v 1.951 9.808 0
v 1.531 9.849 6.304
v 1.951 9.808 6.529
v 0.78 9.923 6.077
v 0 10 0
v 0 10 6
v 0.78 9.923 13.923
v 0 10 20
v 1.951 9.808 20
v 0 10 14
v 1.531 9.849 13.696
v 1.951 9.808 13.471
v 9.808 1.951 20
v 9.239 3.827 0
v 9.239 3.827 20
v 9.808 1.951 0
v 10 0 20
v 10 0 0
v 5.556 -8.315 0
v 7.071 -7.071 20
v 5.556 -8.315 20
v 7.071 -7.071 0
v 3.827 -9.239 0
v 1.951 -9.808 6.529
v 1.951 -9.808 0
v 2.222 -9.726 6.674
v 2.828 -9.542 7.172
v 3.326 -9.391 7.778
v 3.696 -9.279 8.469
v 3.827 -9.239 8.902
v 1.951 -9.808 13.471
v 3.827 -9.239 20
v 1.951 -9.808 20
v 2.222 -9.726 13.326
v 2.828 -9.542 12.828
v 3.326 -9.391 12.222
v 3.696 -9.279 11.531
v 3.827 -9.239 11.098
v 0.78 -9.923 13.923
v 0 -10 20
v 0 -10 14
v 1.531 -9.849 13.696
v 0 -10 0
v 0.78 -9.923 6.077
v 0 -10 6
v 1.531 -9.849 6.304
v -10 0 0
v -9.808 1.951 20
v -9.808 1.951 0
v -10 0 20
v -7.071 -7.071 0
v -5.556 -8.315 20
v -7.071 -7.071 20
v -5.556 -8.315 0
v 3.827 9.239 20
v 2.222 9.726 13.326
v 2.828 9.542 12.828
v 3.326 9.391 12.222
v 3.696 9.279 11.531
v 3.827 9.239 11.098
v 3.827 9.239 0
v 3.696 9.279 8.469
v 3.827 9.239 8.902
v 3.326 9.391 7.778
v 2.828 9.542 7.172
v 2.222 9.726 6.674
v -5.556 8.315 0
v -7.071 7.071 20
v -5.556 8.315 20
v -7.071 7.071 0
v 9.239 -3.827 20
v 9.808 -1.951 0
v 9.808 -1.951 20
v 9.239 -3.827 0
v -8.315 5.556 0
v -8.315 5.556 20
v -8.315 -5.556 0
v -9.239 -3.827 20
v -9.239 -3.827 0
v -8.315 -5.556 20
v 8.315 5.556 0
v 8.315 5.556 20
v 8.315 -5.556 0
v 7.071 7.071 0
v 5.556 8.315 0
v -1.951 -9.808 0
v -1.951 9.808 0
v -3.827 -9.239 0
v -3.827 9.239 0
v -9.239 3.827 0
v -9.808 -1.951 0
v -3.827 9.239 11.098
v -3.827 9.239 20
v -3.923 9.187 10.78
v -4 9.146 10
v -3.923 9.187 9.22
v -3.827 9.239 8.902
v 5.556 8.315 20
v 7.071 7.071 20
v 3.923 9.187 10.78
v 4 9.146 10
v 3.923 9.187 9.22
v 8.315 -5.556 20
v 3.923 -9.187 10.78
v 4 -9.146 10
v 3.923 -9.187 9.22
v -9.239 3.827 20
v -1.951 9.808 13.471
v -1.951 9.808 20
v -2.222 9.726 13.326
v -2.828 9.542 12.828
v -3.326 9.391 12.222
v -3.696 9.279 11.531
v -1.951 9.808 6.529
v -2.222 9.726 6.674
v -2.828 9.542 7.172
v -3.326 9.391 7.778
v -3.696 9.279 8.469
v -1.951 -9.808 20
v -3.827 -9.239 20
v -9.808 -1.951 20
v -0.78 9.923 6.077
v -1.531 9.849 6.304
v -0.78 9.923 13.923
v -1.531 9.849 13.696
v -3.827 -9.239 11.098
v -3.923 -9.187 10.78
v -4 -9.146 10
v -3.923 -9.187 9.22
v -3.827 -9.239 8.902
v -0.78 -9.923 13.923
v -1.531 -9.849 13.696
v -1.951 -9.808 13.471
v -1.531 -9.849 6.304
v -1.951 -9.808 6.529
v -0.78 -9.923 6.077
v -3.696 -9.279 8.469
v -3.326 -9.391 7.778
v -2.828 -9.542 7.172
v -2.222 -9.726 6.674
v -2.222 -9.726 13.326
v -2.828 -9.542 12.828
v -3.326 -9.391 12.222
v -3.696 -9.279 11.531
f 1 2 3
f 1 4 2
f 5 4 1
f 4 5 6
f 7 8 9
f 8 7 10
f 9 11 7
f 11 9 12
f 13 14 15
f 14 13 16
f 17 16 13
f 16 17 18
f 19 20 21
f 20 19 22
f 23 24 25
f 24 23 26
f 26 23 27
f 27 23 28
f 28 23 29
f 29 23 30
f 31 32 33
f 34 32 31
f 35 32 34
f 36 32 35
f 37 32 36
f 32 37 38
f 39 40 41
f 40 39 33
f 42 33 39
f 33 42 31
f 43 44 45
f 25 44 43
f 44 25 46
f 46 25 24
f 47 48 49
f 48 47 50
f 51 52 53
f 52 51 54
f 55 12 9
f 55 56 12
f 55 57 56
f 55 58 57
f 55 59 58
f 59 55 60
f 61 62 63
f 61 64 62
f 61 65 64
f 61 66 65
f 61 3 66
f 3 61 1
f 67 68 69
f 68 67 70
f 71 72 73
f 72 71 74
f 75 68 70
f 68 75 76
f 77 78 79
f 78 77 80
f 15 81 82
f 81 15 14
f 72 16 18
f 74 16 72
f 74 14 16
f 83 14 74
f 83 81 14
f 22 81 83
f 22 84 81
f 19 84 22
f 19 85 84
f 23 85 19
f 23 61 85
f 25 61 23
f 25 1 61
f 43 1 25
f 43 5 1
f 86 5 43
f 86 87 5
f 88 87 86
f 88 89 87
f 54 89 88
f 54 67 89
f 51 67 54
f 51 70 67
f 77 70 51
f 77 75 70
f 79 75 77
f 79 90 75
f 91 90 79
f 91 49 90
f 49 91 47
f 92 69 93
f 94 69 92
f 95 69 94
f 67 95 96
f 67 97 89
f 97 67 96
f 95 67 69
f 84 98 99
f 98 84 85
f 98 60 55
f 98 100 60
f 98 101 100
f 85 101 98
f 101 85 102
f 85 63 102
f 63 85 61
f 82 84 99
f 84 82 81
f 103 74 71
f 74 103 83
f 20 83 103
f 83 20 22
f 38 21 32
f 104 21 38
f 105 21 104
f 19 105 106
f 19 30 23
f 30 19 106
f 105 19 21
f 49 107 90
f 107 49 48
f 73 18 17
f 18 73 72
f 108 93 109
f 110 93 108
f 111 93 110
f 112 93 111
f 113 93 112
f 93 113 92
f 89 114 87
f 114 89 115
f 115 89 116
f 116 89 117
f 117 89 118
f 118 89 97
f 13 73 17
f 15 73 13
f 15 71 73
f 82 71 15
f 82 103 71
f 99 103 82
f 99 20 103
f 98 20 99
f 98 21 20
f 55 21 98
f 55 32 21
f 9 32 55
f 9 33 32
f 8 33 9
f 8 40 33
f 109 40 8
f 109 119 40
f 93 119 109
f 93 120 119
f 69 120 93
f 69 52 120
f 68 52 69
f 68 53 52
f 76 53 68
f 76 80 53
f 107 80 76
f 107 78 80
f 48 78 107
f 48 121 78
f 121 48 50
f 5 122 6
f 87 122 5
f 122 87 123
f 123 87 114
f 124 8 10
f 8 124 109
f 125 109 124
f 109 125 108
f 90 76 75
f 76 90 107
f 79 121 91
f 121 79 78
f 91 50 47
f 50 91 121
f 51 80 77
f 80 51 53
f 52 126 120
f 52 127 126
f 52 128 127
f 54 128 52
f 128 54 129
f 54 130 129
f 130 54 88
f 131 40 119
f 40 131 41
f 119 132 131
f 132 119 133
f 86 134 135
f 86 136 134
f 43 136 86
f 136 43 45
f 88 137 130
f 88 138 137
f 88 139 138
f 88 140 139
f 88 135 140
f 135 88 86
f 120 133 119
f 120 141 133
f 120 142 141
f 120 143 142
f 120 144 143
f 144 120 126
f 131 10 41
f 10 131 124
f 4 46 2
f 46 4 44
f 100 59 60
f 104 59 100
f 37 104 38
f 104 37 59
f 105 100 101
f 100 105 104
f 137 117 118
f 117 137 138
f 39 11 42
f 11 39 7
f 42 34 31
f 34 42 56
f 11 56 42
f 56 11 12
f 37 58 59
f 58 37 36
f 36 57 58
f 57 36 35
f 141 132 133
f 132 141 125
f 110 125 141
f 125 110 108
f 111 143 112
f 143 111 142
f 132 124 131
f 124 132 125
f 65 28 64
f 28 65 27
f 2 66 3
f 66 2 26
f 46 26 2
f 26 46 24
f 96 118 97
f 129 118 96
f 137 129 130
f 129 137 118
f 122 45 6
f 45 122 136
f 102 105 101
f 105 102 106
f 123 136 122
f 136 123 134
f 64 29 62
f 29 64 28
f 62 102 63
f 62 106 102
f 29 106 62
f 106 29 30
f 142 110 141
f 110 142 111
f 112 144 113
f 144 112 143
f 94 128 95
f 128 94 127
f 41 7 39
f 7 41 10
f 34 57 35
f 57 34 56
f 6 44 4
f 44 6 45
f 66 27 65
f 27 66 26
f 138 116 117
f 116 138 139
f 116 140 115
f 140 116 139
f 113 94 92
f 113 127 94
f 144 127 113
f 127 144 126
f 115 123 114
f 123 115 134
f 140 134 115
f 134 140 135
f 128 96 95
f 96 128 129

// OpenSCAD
// A cylinder bored across, whose trim is a quartic.
//
// This is roadmap item 4's general case at its smallest. The wall and the bore
// are both declared cylinders and both are exactly right, so nothing is left to
// declare - what is missing is the curve where they meet. Two cylinders
// intersect in a quartic, and STEP has no entity for it: OpenCASCADE's own
// export of this solid writes the trim as a degree-7 B_SPLINE_CURVE_WITH_KNOTS
// of some thirty control points. So the general case is inherently an
// approximation, and it is gated as one.
//
// The band recogniser cannot write either face. A band *is* two rims at a
// constant height, and neither of these rims is: the bore's ends are where it
// meets the wall, and the wall is opened by a hole. Its exact pass therefore
// takes only the arc-bounded parts of the wall - two partial cylinders, twenty
// facets - and leaves the other fifty-two to the trimmed-quadric pass.
//
// That pass now takes ten of them, and it is the *bore* it writes, not the wall.
// The wall is the 32-gon here, so each of its facets is a flat plane, and a
// plane cuts the bore cylinder in an ellipse - exact, and written as one. The
// mesh edges where the bore meets a wall facet are chords of that ellipse; the
// ellipse replaces them, the wall facet on the other side is handed the same
// edge, and the bore's regions stop being bounded off themselves.
// EXPECT: 10 trimmed quadrics written as one face each, replacing 24 facets
//
// So the census moves by arithmetic, not by measurement: each replaced facet was
// one PLANE, so 54 - 24 = 30 remain, and the two partial cylinders the band pass
// already wrote are joined by the ten new ones for 12.
//
// And the ellipses are the model's, down to their axes. The wall's facet normals
// lie at 5.625 + 11.25k degrees from x; the bore runs along y; so a facet plane
// meets the bore at a tilt whose cosine is |sin| of that angle, and the section
// has the bore's own radius 4 across it and 4/|sin| along it. Only three of
// those angles reach the bore at all, and the file carries exactly their three
// values - 4/sin(61.875) = 4.5356 on four arcs, 4/sin(73.125) = 4.1800 on
// eight, 4/sin(84.375) = 4.0194 on eight. Twenty arcs, which is what the export
// reports, and every minor semi-axis is 4 because a plane section of a cylinder
// is as wide as the cylinder however it is tilted - validatestep.py checks that
// one on every ellipse in every export.
// EXPECT: 20 plane sections written as the conic it is
// EDGES: Ellipse=20
//
// Provenance, reported and gating nothing. Manifold keeps an id per run of
// triangles through a boolean chain - it is what makes colour survive a
// difference() - and this says what survived. Two originals here, the wall and
// the bore, which is the whole model. It is asserted because a channel nothing
// checks is a channel that quietly stops working, and because the number is
// derivable by looking at the model rather than at the exporter.
// EXPECT: the mesh comes from 2 original solids over 288 facets
// EXPECT: 2 analytic surfaces available (2 cylindrical, 0 spherical, 0 toroidal, 0 Bezier)
// EXPECT: 2 surfaces recognised (0 toroidal, 0 spherical, 0 conical, 2 partial), 20 facets replaced
// ROUNDTRIP: Cylinder=12 Plane=30
//
// With the approximation flag the trimmed-quadric path takes the rest. It
// claims facets by distance to the axis rather than by walking rings, and
// bounds the face with the mesh's own polyline - the same bound the faceted
// faces around it already use, so the shell closes edge for edge. Seven
// cylinder faces: the bore goes all the way round between its two mouths and
// is one face closed by a seam along a ruling - until 2026-09-25 it was cut in
// two at the seam, an edge the model does not have (checklist D1) - and the
// wall, which the bore cuts into pieces, one face each.
// Five faces, not three. The bore cuts the wall into separate regions and a
// face cannot be in two places, so each region is its own face; the two the
// count gained were being carried as inner bounds of the others, which is
// what an inner bound is not for.
// APPROX: 5 trimmed quadrics written as one face each, replacing 52 facets
// APPROX: 1 face round its axis between two rims closed by a seam along a ruling
// APPROX: approximation found nothing left to fit
// ROUNDTRIP-APPROX: Cylinder=7 Plane=2
//
// And in the approximation tier the opening is neither chords nor sections any
// more: it is the curve itself. Once the corner placement has put the junction
// vertices on both cylinders, every edge between two of them lies on the quartic
// where the two cross, and the exporter writes that - fitted to the true curve
// found from the two *declarations*, held to 1e-7, and read identically by both
// faces because it is decided once for the edges it covers.
//
// One curve per run of those edges, not one per edge: until 2026-09-25 it was
// eighty, each a Bezier over one mesh edge, joined at vertices nothing else
// meets - the curve in eighty pieces. A run ends where a third edge meets it,
// and that is derivable from lines above. Each mouth borders the bore on one
// side and, since the bore cuts the wall into pieces (ROUNDTRIP-APPROX), two
// wall faces on the other: two runs a mouth, four. And the bore is one face
// closed by a seam along a ruling (the APPROX line above), whose two ends are a
// vertex on each mouth where the seam is the third edge - which cuts one run on
// each mouth. Four plus two.
// APPROX: 6 edges written as the curve where two declared surfaces cross
// APPROX: those 6 curves cover 80 edges of the mesh
// APPROX: 6 of those carry a pcurve on each of the two surfaces
// EDGES-APPROX: BSplineCurve=6
//
// The pcurves are asserted because nothing else here would notice them. The 3D
// curve is definitive, so a reader takes it and ignores them, and a pcurve that
// is wrong leaves the face count, the shell, the round trip and the volume all
// exactly as they are. validatestep.py checks each one against the 3D curve it
// belongs to - see check_surface_curves - and this line checks they were written
// at all.
//
// Eighty is the model's, and it ties two report lines together: the provenance
// pass finds exactly 80 junction vertices owned by two surfaces, the bore opens
// on the wall in two closed loops, and a closed loop through n vertices has n
// edges - which the six curves cover between them.
//
// Why this is allowed to be approximate, measured rather than asserted. Where a
// ruling of the bore met a facet of the wall the vertex is exactly on the true
// bore; where a facet met an *edge* it is not. Of the eighty vertices near the
// bore radius, sixty-four are exact to 1e-9 and sixteen are off by at most
// 0.018804 - against that region's own tessellation band of 0.0193. The trim
// strays no further than the mesh already allows, which is the same licence the
// rest of the approximation pass runs on.
//
// The volume is derived, and it is not elementary: two perpendicular cylinders
// of *different* radii meet in an elliptic integral. For each x the bore fixes z
// over 2*sqrt(16-x^2) and the wall fixes y over 2*sqrt(100-x^2), so the shared
// volume is 8*int_0^4 sqrt((16-x^2)(100-x^2)) dx = 984.779688, and the solid is
// pi*100*20 - that = 5298.405619. OpenCASCADE, asked to build the same solid
// from its own primitives and measure it, says 5298.405182 - agreement to 8e-8,
// which is what says the figure is right rather than merely repeatable.
//
// And there is nothing left for the tolerance to cover. Every face is the exact
// cylinder, every boundary segment around one at constant height is an arc of
// it, and the opening is the quartic. The approximation export measures
//
//     derived                       5298.405619
//     chords                        5301.57       short by 3.16
//     plane sections on one surface 5298.921138   over by 0.5155
//     the curve where they cross    5298.405620   over by 1e-06
//
// Two parts in 1e13, on a solid whose trim curve ISO 10303 has no entity for.
// The quartic is still approximated - a Bezier through it, degree raised until
// the fit is inside 1e-7 - but it approximates the *true* curve rather than the
// mesh, which is the whole of the difference.
//
// So the window comes off. It used to be +/- 5.0, bounded by the bore's own
// tessellation - a chord of a 32-gon on r=4 lies at most 4*(1-cos(pi/32)) =
// 0.0193 inside the true circle, over about 460 square units of bore, so no more
// than 4.4 could be lost that way. None of that applies to a trim which is the
// curve. What is left is the default 1e-6 relative, 0.0053, and the export is
// inside it by four thousand times.
//
// The deficit used to read 1.87 rather than 3.16, which was the smaller number
// for the worse reason - the outer rim was inscribed too, and its error had the
// opposite sign and very nearly cancelled the bore's. That is the reason a
// volume window is a poor way to lock in a boundary and EDGES-APPROX is a good
// one: two errors of opposite sign look like accuracy.
// VOLUME-APPROX: 5298.405619
//
// Every facet its maker named for a declared surface is D0 by that heritage,
// whole or cut, and has to end in a face written on that surface (checklist
// B6, B7, E8). A facet a boolean cut is not in its surface's D0 region yet -
// the region holds whole facets only - so nothing proposes it at the exact
// tier, and at the approximation tier a statistic over the tessellation
// refuses it (C3). Measured 2026-09-29:
//   exact tier, 28 facets (28 cut): 20 on cylinder 0 (claimed by nothing for it); 8 on cylinder 3
//     (claimed by nothing for it)
// Tolerated by name until cut facets join their region and no statistic
// vetoes a named facet (doc/step-export-wip.md, open item 34); the test
// fails the day it is no longer raised.
// KNOWN-EXPORT-ERROR: facets named by their maker for a declared surface are not written on it
//
// Every EXPORT-WARNING this fixture raises, named, each with why it is known;
// any other fails the test, and so does a named one no run raises any more.
//
// One declared surface written partly by one recogniser and partly by
// another, the division decided by pass order - the split surface of open
// item 26, which R0 (item 29) has not reached here.
// KNOWN-EXPORT-WARNING: split between different kinds of recogniser
// KNOWN-EXPORT-WARNING: so this is one connected region cut in two by pass order
$fn = 32;
difference() {
	cylinder(r = 10, h = 20);
	translate([0, 0, 10]) rotate([90, 0, 0]) cylinder(r = 4, h = 60, center = true);
}
